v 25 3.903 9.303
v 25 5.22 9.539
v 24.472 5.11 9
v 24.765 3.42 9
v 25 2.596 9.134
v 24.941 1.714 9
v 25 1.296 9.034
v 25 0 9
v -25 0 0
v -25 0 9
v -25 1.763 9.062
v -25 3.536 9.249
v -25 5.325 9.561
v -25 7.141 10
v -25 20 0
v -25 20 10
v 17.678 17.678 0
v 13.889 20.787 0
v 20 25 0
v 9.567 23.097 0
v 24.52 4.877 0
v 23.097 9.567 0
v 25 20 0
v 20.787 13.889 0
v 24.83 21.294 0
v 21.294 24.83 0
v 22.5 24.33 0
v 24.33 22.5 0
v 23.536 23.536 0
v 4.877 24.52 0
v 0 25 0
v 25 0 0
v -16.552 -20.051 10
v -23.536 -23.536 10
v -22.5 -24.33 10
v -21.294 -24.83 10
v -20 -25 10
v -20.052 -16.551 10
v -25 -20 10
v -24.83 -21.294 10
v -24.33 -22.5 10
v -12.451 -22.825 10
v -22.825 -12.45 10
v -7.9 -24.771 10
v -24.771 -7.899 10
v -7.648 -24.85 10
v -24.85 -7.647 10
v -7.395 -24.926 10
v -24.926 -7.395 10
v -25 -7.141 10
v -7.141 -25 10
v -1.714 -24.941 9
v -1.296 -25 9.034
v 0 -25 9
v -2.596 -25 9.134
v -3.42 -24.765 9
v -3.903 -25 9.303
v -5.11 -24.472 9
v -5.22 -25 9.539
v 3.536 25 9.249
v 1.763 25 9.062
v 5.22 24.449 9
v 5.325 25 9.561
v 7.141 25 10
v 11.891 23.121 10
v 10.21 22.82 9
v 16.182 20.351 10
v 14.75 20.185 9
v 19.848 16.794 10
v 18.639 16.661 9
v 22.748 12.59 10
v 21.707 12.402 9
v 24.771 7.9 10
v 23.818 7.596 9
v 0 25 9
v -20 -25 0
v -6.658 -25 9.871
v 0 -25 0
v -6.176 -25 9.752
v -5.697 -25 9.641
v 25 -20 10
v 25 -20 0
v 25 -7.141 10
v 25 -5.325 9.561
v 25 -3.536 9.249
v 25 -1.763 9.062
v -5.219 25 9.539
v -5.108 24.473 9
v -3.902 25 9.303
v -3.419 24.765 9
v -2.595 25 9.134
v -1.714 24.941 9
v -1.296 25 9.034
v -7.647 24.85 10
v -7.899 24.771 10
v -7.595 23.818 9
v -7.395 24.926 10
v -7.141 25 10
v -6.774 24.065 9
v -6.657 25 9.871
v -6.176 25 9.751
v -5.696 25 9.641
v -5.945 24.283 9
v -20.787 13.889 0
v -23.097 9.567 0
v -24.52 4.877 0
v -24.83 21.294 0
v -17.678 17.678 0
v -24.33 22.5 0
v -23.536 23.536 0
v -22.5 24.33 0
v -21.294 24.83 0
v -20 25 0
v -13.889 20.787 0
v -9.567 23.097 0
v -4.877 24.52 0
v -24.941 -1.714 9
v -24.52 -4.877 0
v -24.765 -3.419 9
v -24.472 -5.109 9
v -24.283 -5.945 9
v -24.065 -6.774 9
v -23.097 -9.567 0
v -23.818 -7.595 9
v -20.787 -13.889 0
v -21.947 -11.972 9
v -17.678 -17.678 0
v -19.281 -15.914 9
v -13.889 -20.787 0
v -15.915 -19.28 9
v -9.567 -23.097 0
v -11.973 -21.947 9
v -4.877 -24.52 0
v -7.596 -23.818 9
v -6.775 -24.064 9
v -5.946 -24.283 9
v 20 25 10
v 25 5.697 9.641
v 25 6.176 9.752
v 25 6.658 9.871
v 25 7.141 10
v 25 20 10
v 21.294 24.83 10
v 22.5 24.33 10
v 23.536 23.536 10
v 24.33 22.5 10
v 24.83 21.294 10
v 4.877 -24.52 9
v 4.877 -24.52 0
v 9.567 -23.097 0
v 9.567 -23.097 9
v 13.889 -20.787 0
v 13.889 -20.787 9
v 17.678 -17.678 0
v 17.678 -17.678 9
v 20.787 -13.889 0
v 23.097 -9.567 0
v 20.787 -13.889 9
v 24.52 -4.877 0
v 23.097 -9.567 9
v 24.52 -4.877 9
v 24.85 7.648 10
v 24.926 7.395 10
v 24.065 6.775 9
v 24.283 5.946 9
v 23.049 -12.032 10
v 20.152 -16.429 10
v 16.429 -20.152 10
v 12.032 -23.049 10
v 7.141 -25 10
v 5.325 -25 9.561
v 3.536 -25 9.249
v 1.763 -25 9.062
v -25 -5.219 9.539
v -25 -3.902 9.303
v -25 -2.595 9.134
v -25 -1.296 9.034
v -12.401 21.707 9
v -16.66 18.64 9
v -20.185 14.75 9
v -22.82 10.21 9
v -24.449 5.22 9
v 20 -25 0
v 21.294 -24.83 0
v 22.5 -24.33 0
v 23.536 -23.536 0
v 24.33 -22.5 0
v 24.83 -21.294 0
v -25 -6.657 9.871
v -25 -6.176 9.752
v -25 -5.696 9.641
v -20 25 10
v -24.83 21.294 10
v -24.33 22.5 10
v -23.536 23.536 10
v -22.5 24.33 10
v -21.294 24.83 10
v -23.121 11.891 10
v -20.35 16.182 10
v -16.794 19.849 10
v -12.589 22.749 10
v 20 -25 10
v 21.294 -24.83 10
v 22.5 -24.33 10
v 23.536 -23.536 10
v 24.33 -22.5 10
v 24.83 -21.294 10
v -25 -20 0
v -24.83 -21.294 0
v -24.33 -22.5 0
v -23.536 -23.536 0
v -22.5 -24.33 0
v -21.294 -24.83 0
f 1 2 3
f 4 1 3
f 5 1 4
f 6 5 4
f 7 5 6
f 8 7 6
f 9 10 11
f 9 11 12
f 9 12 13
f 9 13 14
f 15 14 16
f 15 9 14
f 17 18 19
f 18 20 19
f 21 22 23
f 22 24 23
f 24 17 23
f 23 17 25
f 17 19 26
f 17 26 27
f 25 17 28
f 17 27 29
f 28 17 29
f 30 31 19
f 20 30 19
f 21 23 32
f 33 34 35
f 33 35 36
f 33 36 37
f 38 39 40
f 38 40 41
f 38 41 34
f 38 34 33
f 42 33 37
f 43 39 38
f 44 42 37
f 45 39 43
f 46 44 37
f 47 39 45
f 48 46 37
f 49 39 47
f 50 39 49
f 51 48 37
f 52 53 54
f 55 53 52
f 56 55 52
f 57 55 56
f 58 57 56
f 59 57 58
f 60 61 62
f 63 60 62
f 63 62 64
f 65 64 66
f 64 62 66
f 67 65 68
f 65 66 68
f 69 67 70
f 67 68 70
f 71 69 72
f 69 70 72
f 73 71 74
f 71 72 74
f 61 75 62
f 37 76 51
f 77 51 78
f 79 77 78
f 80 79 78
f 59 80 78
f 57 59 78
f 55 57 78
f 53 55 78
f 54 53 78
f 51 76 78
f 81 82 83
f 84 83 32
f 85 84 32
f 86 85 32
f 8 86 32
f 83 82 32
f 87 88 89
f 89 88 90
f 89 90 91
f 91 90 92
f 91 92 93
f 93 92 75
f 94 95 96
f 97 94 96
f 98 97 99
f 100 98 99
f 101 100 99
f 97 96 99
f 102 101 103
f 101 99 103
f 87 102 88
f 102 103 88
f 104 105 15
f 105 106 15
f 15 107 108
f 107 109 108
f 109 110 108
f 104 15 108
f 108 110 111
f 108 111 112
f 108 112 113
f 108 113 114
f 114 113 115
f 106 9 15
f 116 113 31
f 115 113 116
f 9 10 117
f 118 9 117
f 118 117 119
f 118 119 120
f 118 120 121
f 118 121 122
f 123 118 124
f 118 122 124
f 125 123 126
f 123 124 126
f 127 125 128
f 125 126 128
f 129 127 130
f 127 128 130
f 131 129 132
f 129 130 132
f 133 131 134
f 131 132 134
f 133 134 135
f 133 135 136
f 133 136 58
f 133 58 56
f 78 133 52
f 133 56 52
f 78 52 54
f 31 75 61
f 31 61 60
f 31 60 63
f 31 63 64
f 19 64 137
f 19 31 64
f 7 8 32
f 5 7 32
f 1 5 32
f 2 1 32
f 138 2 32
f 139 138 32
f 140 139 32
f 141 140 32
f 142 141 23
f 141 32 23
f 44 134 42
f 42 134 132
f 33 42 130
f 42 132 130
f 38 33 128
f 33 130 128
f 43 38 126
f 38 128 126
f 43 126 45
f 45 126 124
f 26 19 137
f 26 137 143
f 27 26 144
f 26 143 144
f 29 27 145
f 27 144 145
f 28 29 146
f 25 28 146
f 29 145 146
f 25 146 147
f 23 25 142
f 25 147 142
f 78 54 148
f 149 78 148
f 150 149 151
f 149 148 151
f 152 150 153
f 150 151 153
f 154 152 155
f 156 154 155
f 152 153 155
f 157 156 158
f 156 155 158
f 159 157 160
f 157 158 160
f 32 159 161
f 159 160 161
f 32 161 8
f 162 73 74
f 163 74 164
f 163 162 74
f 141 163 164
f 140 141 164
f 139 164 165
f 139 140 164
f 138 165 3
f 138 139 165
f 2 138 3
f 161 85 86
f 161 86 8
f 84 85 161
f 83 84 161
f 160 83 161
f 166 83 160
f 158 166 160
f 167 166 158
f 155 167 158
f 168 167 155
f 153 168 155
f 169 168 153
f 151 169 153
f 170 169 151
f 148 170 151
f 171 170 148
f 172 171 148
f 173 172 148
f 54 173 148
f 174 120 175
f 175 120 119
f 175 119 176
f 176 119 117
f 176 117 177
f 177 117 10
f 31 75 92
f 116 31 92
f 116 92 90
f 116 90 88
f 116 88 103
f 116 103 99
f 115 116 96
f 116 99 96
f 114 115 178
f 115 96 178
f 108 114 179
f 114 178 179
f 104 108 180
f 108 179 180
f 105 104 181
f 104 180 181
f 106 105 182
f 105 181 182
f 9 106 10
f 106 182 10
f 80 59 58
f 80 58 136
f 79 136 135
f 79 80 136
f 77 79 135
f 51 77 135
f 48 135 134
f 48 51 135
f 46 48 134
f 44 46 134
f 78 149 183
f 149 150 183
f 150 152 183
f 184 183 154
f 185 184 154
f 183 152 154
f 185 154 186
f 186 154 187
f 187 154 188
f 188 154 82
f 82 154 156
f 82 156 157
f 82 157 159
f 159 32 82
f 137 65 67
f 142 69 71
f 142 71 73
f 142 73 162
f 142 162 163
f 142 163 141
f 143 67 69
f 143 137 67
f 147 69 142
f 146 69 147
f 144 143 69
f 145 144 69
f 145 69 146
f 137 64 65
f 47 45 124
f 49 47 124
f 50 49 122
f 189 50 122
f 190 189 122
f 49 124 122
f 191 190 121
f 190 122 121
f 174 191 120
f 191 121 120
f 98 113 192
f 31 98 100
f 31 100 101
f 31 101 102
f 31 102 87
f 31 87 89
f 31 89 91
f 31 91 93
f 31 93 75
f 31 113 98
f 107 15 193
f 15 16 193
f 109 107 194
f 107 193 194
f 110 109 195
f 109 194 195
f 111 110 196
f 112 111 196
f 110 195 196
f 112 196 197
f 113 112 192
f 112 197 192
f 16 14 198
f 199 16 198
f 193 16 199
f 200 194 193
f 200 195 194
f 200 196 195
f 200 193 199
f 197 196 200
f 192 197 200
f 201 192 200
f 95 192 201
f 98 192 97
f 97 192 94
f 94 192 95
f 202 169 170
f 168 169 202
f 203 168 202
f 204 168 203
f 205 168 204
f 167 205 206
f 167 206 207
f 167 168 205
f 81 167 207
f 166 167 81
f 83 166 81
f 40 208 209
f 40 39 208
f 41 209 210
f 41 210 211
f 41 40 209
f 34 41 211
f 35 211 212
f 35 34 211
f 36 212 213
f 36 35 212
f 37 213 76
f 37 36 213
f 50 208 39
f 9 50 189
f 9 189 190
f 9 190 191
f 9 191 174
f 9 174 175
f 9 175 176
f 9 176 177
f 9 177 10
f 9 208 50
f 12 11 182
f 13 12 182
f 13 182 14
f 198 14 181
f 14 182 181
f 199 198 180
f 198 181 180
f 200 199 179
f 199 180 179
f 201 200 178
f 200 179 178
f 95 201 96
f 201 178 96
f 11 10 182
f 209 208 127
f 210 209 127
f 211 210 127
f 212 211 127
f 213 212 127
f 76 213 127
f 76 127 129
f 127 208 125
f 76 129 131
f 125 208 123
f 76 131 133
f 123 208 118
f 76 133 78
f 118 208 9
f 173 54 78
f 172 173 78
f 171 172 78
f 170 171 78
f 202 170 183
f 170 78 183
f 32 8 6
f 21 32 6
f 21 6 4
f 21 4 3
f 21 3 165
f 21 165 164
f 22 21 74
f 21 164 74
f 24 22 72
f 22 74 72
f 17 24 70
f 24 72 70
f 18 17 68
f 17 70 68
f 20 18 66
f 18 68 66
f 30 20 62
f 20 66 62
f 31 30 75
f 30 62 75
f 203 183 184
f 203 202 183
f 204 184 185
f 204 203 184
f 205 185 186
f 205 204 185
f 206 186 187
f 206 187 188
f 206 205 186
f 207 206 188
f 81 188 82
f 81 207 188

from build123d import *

# Parameters (mm, degrees)
F0_W           = 50
F0_H           = 50
F1_DEPTH       = 10
F3_DEPTH       = 10.001
F4_R           = 5
F5_T2_ANGLE    = 125.3773855197
F5_S1_T2_ANGLE = 95.892873339
F5_S2_T2_ANGLE = 95.8953917499
F5_S3_T2_ANGLE = 66.4146031024


# Not quite as in the source:
# - a fillet or chamfer that OpenCascade refuses, or shapes differently, is made with other operations: its cross-section is extruded or revolved along the edge and cut away or added


with BuildPart() as f1:
    # F0 (on Top) → F1 (new body)
    with BuildSketch(Plane.XY):
        Rectangle(F0_W, F0_H)
    extrude(amount=F1_DEPTH)

    # F2 (on face) → F3 (cut, through all)
    with BuildSketch(Plane.XY.offset(10)):
        with BuildLine():
            ThreePointArc((-5.83e-08, -25), (17.677669509, -17.6776695503), (25, 0))
            ThreePointArc((25, 0), (17.6776695297, 17.6776695297), (0, 25))
            ThreePointArc((0, 25), (-17.6776695204, 17.6776695389), (-25, 2.61e-08))
            ThreePointArc((-25, 2.61e-08), (-17.6776695595, -17.6776694998), (-5.83e-08, -25))
        make_face()
    extrude(amount=-F3_DEPTH, mode=Mode.SUBTRACT)

    # F4
    f4_edges = [f1.edges().sort_by_distance(p)[0] for p in [
        (25, -25, 5),
        (25, 25, 5),
        (-25, 25, 5),
        (-25, -25, 5),
    ]]
    fillet(f4_edges, radius=F4_R)

    # F5: chamfer of 1 on 1 edges, made by hand

    # F5_s1 → F5_t2 (revolve, cut)
    with BuildSketch(Plane(origin=(0, 0, 0), x_dir=(0, 0, 1), z_dir=(-0.3038450488, 0.9527214631, 0))):
        Polygon((9, 25), (10, 26), (10, 25), align=None)
    revolve(axis=Axis((0, 0, 10), (0, 0, -1)), revolution_arc=F5_T2_ANGLE, mode=Mode.SUBTRACT)

    # F5#s1: chamfer of 1 on 1 edges, made by hand

    # F5_s1_s1 → F5_s1_t2 (revolve, cut)
    with BuildSketch(Plane(origin=(0, 0, 0), x_dir=(0, 0, 1), z_dir=(-0.9527348163, -0.3038031761, 0))):
        Polygon((10, 26), (9, 25), (10, 25), align=None)
    revolve(axis=Axis((0, 0, 10), (0, 0, -1)), revolution_arc=F5_S1_T2_ANGLE, mode=Mode.SUBTRACT)

    # F5#s2: chamfer of 1 on 1 edges, made by hand

    # F5_s2_s1 → F5_s2_t2 (revolve, cut)
    with BuildSketch(Plane(origin=(0, 0, 0), x_dir=(0, 0, 1), z_dir=(0.3038031783, -0.9527348156, 0))):
        Polygon((10, 26), (9, 25), (10, 25), align=None)
    revolve(axis=Axis((0, 0, 10), (0, 0, -1)), revolution_arc=F5_S2_T2_ANGLE, mode=Mode.SUBTRACT)

    # F5#s3: chamfer of 1 on 1 edges, made by hand

    # F5_s3_s1 → F5_s3_t2 (revolve, cut)
    with BuildSketch(Plane(origin=(0, 0, 0), x_dir=(0, 0, 1), z_dir=(0.9788889499, -0.2043928171, 0))):
        Polygon((10, 26), (9, 25), (10, 25), align=None)
    revolve(axis=Axis((0, 0, 10), (0, 0, -1)), revolution_arc=F5_S3_T2_ANGLE, mode=Mode.SUBTRACT)


solid = f1.part
